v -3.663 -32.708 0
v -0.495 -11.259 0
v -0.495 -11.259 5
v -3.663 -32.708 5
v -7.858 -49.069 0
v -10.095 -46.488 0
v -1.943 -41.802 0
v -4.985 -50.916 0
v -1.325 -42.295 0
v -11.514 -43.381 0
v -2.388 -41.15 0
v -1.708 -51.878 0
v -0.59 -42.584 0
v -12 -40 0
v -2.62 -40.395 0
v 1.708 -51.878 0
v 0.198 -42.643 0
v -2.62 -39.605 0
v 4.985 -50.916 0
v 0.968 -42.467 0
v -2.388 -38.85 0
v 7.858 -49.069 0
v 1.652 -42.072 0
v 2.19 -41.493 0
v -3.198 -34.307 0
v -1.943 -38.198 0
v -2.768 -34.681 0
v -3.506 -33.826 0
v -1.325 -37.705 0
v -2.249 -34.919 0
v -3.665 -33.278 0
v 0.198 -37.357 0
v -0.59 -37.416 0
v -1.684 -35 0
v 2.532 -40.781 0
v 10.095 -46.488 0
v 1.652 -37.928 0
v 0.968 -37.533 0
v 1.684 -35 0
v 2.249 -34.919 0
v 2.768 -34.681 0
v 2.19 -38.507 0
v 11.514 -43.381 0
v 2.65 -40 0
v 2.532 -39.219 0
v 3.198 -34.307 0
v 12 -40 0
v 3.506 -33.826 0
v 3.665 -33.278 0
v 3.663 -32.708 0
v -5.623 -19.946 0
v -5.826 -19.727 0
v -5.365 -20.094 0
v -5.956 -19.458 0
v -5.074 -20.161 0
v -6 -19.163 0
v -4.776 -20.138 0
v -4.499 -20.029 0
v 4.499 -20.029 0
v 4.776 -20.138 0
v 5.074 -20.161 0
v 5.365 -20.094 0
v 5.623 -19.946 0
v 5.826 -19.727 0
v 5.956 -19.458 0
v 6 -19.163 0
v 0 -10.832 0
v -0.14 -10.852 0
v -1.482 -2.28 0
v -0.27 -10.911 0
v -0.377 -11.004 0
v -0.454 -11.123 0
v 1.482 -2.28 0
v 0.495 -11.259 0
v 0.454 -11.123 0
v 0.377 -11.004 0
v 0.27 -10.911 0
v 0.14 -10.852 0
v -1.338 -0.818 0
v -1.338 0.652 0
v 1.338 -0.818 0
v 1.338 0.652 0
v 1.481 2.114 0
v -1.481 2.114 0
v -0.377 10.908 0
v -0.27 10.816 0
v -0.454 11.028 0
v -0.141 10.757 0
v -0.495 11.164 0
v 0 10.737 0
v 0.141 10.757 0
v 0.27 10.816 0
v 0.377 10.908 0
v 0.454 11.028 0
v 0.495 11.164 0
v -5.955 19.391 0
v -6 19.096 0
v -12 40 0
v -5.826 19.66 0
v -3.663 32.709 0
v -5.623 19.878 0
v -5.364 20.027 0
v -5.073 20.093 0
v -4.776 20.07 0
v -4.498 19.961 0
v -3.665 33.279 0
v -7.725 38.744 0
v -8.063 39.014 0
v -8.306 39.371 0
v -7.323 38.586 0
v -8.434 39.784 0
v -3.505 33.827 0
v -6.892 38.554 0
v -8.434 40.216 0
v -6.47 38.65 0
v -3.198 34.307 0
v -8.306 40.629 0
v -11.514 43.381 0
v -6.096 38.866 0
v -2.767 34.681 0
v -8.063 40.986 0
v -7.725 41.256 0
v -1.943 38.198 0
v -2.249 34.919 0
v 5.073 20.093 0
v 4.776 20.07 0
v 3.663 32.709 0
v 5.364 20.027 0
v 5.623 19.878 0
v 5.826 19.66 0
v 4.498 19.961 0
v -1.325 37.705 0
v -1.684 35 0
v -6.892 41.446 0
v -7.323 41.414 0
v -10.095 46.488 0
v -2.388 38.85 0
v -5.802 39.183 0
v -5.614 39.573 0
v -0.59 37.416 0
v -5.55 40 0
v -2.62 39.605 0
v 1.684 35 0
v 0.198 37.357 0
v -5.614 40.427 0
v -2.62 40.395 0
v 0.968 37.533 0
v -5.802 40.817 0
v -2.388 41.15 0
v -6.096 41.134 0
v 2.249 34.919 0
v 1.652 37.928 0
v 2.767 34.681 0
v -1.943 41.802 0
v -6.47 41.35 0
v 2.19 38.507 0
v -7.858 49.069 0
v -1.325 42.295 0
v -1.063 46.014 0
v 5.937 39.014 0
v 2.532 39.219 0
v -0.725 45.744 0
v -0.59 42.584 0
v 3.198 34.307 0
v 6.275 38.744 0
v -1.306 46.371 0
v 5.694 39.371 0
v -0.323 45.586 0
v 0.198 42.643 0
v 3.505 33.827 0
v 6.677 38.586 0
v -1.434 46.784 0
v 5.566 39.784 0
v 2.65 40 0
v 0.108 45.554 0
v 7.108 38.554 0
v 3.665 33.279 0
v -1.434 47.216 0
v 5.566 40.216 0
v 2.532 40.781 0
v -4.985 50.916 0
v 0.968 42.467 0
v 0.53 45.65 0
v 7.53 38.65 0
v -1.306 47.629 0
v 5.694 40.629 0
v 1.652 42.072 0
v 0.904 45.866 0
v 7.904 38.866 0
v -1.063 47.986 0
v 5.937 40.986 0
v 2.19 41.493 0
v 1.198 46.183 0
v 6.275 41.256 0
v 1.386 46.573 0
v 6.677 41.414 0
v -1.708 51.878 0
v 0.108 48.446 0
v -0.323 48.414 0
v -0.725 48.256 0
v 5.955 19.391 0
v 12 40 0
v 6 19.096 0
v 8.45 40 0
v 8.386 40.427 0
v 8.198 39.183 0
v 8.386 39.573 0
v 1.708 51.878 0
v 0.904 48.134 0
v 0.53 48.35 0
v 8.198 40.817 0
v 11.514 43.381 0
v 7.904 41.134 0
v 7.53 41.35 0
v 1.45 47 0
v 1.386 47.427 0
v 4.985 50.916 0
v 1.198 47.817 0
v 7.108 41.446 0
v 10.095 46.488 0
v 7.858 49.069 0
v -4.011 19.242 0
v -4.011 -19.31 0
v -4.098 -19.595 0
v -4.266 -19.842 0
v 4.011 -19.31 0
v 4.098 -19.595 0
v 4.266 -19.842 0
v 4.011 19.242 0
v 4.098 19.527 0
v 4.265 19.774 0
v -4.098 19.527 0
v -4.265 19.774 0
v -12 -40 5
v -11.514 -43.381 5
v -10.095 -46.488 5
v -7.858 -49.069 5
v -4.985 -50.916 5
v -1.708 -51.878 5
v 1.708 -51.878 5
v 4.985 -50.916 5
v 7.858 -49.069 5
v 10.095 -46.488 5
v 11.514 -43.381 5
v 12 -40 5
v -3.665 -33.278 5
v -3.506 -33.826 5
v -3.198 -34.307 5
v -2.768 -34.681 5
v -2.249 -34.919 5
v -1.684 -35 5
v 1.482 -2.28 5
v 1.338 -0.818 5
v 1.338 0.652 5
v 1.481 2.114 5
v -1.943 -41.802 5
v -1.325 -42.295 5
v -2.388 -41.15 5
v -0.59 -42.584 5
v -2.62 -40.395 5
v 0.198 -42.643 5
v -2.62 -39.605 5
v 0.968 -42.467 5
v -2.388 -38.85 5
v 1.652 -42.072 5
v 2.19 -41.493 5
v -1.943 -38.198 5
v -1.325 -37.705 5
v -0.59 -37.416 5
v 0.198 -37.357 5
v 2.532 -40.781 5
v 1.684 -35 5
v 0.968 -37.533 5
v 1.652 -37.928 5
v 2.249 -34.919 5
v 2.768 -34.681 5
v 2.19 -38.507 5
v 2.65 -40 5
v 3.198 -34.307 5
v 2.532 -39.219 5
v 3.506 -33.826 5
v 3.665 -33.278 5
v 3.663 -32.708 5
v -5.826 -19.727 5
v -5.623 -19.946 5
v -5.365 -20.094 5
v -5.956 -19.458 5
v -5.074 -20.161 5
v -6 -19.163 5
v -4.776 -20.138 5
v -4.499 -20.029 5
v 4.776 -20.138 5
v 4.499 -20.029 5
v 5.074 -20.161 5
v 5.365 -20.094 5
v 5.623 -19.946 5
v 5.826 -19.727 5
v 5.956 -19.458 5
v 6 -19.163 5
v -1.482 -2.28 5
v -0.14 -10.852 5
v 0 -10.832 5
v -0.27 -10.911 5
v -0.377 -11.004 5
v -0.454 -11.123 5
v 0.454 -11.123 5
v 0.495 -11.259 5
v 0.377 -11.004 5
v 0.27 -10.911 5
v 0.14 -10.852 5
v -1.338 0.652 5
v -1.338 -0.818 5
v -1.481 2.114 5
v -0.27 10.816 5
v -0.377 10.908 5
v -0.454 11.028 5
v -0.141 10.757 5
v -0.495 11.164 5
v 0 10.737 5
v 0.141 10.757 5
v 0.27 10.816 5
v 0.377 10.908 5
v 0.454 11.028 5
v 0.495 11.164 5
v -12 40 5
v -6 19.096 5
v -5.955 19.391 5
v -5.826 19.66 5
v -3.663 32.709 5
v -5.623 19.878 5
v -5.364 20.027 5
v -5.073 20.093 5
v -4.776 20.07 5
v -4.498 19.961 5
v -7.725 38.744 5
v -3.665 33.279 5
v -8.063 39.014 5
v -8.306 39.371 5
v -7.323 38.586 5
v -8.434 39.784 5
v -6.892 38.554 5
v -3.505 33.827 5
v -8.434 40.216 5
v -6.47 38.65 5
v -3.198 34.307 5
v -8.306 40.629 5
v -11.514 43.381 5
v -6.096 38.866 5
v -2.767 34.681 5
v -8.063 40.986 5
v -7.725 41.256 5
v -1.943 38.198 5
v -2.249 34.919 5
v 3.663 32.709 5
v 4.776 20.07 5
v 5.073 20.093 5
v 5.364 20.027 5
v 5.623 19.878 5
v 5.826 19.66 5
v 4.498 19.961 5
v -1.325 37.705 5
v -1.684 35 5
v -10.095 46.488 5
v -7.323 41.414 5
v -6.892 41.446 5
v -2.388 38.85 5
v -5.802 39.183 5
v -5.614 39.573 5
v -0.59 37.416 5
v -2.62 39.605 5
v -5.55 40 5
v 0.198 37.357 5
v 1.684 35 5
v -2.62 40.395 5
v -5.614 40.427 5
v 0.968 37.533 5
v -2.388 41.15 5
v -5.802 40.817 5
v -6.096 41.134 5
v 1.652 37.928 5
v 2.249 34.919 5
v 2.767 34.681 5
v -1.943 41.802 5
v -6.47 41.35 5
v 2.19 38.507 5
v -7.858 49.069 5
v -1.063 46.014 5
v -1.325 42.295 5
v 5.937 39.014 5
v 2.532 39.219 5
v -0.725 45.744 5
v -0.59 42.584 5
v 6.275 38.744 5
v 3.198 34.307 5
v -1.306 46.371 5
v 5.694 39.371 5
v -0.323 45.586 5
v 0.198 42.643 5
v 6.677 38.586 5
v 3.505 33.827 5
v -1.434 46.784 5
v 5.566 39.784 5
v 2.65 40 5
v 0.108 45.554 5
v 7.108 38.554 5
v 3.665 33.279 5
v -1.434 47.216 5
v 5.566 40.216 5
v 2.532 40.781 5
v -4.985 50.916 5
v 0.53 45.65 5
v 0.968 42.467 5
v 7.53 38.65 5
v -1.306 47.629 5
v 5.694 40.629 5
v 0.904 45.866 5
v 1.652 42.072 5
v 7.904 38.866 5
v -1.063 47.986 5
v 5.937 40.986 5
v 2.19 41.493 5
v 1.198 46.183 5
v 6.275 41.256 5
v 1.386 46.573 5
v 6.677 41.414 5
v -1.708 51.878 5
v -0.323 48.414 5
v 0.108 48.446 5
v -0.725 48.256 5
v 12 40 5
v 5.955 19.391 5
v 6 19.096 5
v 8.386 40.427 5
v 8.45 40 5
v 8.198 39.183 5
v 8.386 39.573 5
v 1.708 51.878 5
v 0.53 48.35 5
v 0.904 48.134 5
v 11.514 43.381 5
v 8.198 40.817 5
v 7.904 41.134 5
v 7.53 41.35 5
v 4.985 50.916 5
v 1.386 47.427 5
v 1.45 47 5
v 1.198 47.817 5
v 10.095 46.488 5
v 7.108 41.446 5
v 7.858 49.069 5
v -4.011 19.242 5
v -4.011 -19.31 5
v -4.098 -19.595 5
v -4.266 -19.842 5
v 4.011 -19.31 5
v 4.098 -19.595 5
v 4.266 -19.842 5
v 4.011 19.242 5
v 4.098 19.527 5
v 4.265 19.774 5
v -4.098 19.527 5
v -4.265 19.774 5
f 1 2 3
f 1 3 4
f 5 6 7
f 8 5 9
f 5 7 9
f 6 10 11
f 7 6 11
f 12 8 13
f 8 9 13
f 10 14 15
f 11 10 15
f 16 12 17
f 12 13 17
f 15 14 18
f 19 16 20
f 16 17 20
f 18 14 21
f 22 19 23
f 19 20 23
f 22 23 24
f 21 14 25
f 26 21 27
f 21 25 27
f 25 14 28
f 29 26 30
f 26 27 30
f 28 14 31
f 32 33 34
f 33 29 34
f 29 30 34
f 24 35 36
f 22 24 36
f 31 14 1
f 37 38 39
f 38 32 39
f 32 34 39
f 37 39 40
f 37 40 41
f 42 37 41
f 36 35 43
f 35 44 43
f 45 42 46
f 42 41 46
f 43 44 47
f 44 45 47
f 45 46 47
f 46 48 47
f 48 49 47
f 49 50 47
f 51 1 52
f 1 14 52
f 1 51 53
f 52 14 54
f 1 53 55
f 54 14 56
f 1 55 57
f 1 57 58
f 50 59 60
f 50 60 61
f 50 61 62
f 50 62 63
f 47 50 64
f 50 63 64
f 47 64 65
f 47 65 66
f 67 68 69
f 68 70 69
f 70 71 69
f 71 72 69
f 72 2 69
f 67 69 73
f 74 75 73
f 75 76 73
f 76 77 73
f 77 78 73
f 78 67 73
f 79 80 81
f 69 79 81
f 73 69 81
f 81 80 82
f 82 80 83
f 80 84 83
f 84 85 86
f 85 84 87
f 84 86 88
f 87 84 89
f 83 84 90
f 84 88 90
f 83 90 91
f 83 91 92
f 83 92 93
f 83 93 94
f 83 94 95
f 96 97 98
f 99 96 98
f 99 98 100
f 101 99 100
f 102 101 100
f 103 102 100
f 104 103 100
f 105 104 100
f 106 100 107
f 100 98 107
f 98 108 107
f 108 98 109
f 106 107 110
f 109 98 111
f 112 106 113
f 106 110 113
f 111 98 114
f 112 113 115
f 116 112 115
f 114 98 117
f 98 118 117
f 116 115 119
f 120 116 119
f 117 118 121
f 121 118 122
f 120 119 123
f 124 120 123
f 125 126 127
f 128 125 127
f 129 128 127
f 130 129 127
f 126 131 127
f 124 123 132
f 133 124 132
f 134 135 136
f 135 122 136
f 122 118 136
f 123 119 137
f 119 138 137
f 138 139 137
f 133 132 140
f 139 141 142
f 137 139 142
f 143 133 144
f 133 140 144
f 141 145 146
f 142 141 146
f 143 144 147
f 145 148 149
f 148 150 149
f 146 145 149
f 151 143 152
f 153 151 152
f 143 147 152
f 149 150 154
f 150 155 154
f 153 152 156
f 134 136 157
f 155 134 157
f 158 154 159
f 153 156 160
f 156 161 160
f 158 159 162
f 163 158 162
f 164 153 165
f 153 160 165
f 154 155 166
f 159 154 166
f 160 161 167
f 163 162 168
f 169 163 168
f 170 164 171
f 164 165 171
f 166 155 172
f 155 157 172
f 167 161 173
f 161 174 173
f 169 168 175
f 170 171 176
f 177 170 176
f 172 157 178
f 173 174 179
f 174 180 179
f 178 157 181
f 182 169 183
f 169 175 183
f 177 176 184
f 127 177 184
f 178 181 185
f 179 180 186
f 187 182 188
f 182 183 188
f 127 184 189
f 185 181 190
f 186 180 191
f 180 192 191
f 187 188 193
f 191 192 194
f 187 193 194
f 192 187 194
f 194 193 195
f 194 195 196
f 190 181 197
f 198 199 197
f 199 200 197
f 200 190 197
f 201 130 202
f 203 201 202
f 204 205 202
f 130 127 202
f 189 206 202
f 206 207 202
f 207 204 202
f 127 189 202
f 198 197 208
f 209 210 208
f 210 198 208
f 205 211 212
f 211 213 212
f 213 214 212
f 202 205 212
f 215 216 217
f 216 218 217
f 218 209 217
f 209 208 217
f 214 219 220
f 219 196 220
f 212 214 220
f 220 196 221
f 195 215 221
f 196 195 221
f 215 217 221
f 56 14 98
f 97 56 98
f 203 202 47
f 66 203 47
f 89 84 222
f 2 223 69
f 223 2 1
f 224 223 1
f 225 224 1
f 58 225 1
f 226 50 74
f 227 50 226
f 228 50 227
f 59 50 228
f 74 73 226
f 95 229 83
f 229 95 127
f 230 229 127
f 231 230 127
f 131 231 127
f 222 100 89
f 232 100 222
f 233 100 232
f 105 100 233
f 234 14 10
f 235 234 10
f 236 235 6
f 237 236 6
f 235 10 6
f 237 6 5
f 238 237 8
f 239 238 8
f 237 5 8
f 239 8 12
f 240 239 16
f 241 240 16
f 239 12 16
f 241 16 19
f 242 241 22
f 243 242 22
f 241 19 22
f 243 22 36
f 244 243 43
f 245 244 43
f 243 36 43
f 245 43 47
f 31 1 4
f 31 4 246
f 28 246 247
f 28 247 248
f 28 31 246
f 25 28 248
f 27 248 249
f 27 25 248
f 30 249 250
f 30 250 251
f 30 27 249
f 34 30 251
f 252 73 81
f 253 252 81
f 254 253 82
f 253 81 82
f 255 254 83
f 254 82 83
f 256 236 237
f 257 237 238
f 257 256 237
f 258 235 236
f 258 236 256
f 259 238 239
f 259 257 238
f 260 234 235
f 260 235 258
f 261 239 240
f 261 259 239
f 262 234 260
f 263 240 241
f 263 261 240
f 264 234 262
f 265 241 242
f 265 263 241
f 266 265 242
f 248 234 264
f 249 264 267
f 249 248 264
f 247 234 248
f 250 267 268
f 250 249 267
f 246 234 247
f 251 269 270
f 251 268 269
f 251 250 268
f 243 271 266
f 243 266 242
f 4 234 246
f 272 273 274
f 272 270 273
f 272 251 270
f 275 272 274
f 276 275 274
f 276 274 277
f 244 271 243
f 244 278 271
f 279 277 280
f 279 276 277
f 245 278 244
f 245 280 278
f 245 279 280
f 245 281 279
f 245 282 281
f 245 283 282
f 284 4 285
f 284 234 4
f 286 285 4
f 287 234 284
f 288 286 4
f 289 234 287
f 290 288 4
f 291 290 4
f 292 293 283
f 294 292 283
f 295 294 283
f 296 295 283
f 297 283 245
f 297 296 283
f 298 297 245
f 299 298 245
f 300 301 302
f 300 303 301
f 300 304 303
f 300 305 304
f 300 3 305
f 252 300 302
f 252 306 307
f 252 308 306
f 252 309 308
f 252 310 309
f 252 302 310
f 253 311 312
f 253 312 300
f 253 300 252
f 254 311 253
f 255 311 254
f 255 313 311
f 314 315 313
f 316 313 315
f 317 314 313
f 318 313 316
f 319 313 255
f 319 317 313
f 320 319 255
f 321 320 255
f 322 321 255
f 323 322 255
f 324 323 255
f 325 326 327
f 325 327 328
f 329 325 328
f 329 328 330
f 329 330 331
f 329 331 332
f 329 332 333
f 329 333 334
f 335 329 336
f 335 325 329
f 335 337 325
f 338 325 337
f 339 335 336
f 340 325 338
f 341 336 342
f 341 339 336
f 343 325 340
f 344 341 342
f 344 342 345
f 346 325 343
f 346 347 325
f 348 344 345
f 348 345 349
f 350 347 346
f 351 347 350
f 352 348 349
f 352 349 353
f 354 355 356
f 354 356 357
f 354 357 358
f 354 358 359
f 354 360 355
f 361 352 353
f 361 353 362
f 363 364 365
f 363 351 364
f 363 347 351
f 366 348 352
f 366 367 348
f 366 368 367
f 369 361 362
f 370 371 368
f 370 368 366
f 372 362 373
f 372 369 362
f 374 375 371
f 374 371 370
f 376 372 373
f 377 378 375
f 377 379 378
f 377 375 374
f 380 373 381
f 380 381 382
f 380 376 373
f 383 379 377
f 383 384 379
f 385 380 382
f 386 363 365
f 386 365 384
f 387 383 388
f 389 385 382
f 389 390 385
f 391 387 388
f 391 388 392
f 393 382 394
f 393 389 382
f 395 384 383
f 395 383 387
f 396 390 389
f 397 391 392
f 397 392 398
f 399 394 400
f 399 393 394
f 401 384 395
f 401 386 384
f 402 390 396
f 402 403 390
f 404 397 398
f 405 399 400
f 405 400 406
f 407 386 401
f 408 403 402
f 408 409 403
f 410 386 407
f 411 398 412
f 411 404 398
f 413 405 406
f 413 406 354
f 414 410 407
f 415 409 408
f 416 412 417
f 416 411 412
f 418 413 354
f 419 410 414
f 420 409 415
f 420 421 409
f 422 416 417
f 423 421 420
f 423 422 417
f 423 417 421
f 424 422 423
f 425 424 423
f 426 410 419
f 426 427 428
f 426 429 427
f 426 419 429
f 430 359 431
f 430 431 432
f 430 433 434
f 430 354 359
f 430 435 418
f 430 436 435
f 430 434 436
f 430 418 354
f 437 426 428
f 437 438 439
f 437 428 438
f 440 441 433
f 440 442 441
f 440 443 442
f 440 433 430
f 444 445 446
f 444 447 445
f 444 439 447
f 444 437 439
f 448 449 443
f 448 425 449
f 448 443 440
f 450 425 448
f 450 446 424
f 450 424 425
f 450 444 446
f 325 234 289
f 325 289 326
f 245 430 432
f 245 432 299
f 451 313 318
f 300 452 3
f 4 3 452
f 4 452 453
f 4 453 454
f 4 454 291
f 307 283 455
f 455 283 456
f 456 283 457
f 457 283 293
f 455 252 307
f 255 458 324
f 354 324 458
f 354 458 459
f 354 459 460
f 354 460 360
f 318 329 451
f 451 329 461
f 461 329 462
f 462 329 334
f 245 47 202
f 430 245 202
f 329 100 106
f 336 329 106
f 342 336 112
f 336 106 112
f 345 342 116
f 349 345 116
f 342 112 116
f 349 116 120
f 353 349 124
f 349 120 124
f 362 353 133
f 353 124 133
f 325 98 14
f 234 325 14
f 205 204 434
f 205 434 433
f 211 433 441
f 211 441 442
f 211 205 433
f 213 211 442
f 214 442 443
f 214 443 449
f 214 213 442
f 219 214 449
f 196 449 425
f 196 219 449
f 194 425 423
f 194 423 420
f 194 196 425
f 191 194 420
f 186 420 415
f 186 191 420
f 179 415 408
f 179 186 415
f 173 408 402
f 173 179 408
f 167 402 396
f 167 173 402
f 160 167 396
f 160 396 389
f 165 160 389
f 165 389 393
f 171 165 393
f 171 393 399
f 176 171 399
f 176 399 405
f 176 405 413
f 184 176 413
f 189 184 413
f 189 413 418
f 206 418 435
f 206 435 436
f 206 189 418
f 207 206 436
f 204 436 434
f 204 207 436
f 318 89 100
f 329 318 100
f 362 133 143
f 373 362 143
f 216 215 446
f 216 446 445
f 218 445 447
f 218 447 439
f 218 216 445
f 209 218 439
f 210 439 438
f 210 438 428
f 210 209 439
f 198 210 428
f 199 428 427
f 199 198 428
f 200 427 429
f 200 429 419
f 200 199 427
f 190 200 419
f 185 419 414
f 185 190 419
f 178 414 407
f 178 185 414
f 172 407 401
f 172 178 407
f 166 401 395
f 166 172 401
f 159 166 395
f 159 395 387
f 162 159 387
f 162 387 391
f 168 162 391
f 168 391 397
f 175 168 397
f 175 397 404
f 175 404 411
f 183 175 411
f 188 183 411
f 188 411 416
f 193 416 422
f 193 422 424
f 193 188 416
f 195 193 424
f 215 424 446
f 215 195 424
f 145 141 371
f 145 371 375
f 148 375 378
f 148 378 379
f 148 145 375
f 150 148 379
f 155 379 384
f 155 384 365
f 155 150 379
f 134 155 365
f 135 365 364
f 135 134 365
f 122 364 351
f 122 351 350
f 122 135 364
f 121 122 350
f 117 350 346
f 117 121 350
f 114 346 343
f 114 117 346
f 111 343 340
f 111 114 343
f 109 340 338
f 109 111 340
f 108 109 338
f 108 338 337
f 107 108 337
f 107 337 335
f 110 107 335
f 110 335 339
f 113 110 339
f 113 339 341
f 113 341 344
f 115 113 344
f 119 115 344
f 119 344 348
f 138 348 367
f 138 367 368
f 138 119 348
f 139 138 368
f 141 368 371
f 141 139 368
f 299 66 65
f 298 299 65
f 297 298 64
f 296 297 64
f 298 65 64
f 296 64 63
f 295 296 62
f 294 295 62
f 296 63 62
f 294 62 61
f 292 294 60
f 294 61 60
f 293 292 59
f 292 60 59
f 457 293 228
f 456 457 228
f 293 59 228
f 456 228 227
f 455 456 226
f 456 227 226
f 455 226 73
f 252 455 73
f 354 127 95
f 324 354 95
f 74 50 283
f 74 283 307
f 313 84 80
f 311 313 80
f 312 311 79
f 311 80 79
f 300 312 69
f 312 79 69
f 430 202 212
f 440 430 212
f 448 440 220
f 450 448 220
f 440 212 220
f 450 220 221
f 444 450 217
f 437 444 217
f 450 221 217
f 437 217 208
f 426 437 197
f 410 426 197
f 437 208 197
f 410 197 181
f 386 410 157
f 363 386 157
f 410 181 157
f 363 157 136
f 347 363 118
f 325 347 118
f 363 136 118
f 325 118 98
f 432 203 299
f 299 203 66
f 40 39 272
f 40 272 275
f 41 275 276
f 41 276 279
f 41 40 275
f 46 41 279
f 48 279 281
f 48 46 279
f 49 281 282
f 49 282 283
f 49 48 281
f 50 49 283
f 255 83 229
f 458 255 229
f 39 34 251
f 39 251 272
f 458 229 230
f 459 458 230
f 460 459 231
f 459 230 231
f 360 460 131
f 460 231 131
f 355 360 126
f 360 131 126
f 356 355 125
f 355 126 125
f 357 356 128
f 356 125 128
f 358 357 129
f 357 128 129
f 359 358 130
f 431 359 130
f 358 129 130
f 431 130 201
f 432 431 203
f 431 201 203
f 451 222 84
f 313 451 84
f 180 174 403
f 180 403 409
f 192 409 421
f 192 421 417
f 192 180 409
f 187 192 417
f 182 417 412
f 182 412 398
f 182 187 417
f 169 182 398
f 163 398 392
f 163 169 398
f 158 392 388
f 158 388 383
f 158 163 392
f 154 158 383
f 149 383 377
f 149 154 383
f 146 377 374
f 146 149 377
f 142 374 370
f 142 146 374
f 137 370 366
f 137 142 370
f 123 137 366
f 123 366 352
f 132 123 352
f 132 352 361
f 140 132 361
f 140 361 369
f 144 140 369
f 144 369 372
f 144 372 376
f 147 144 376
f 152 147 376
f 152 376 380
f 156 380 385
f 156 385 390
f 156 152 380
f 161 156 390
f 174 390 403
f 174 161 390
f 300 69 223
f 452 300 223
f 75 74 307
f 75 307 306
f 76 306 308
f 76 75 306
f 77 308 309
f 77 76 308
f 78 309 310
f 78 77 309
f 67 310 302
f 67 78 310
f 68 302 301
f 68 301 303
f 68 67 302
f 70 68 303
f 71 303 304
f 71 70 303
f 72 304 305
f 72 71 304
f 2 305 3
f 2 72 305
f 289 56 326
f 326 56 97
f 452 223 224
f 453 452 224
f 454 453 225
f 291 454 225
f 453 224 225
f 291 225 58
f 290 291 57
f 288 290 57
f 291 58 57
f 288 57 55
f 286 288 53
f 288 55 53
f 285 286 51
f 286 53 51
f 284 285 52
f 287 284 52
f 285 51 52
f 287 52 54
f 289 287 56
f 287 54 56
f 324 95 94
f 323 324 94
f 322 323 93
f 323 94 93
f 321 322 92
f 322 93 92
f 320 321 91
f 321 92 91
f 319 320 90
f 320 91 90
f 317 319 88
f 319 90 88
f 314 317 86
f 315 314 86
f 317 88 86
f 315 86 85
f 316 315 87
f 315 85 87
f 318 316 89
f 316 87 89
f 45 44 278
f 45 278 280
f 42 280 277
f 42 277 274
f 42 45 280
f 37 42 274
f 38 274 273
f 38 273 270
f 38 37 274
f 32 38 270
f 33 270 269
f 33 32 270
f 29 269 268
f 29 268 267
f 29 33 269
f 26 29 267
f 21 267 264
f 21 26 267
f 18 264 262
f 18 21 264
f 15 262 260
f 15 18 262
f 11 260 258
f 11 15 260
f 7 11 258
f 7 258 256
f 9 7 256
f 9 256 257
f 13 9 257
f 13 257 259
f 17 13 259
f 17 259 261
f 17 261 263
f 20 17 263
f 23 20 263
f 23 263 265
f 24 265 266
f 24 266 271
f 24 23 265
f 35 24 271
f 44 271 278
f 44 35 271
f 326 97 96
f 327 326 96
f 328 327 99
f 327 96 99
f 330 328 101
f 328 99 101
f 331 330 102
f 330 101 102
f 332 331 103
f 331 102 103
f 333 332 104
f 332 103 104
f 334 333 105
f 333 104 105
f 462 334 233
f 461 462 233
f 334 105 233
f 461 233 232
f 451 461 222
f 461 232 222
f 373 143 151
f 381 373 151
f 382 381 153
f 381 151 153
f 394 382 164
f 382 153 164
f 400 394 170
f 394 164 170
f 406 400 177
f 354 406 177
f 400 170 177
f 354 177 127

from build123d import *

# Parameters (mm, degrees)
SKETCH_1_R      = 2.65
SKETCH_1_R_2    = 1.45
EXTRUDE_1_DEPTH = 5


with BuildPart() as part:
    # 草图1 → 凸台-拉伸1 (new body)
    with BuildSketch(Plane.XY):
        with BuildLine():
            Line((-12, 40), (-12, -40))
            ThreePointArc((-12, -40), (0, -52), (12, -40))
            Line((12, -40), (12, 40))
            ThreePointArc((12, 40), (0, 52), (-12, 40))
        make_face()
        with Locations((0, 40)):
            Circle(SKETCH_1_R, mode=Mode.SUBTRACT)
        with Locations((0, -40)):
            Circle(SKETCH_1_R, mode=Mode.SUBTRACT)
        with Locations((7, 40)):
            Circle(SKETCH_1_R_2, mode=Mode.SUBTRACT)
        with Locations((-7, 40)):
            Circle(SKETCH_1_R_2, mode=Mode.SUBTRACT)
        with Locations((0, 47)):
            Circle(SKETCH_1_R_2, mode=Mode.SUBTRACT)
        with BuildLine():
            Line((-1.684371732, 35), (1.684371732, 35))
            ThreePointArc((1.684371732, 35), (3.19797273, 34.307291865), (3.663090003, 32.709012019))
            Line((3.663090003, 32.709012019), (0.494679568, 11.16382106))
            ThreePointArc((0.494679568, 11.16382106), (0, 10.736568055), (-0.494679568, 11.16382106))
            Line((-0.494679568, 11.16382106), (-3.663090003, 32.709012019))
            ThreePointArc((-3.663090003, 32.709012019), (-3.19797273, 34.307291865), (-1.684371732, 35))
        make_face(mode=Mode.SUBTRACT)
        with BuildLine():
            Line((6, 19.095781345), (6, -19.163256412))
            ThreePointArc((6, -19.163256412), (5.073630361, -20.160542013), (4.01084286, -19.31011741))
            Line((4.01084286, -19.31011741), (1.482419396, -2.280353461))
            ThreePointArc((1.482419396, -2.280353461), (1.319777526, -0.083000608), (1.480789762, 2.114472259))
            Line((1.480789762, 2.114472259), (4.010734218, 19.241908728))
            ThreePointArc((4.010734218, 19.241908728), (5.073260555, 20.09309418), (6, 19.095781345))
        make_face(mode=Mode.SUBTRACT)
        with BuildLine():
            Line((-1.684371732, -35), (1.684371732, -35))
            ThreePointArc((1.684371732, -35), (3.19839114, -34.306807267), (3.662903296, -32.707745233))
            Line((3.662903296, -32.707745233), (0.494632891, -11.258914622))
            ThreePointArc((0.494632891, -11.258914622), (0, -10.831978314), (-0.494632891, -11.258914622))
            Line((-0.494632891, -11.258914622), (-3.662903296, -32.707745233))
            ThreePointArc((-3.662903296, -32.707745233), (-3.19839114, -34.306807267), (-1.684371732, -35))
        make_face(mode=Mode.SUBTRACT)
        with BuildLine():
            Line((-6, -19.163256412), (-6, 19.095781345))
            ThreePointArc((-6, 19.095781345), (-5.073260555, 20.09309418), (-4.010734218, 19.241908728))
            Line((-4.010734218, 19.241908728), (-1.480789762, 2.114472259))
            ThreePointArc((-1.480789762, 2.114472259), (-1.319777526, -0.083000608), (-1.482419396, -2.280353461))
            Line((-1.482419396, -2.280353461), (-4.01084286, -19.31011741))
            ThreePointArc((-4.01084286, -19.31011741), (-5.073630361, -20.160542013), (-6, -19.163256412))
        make_face(mode=Mode.SUBTRACT)
    extrude(amount=EXTRUDE_1_DEPTH)


solid = part.part
